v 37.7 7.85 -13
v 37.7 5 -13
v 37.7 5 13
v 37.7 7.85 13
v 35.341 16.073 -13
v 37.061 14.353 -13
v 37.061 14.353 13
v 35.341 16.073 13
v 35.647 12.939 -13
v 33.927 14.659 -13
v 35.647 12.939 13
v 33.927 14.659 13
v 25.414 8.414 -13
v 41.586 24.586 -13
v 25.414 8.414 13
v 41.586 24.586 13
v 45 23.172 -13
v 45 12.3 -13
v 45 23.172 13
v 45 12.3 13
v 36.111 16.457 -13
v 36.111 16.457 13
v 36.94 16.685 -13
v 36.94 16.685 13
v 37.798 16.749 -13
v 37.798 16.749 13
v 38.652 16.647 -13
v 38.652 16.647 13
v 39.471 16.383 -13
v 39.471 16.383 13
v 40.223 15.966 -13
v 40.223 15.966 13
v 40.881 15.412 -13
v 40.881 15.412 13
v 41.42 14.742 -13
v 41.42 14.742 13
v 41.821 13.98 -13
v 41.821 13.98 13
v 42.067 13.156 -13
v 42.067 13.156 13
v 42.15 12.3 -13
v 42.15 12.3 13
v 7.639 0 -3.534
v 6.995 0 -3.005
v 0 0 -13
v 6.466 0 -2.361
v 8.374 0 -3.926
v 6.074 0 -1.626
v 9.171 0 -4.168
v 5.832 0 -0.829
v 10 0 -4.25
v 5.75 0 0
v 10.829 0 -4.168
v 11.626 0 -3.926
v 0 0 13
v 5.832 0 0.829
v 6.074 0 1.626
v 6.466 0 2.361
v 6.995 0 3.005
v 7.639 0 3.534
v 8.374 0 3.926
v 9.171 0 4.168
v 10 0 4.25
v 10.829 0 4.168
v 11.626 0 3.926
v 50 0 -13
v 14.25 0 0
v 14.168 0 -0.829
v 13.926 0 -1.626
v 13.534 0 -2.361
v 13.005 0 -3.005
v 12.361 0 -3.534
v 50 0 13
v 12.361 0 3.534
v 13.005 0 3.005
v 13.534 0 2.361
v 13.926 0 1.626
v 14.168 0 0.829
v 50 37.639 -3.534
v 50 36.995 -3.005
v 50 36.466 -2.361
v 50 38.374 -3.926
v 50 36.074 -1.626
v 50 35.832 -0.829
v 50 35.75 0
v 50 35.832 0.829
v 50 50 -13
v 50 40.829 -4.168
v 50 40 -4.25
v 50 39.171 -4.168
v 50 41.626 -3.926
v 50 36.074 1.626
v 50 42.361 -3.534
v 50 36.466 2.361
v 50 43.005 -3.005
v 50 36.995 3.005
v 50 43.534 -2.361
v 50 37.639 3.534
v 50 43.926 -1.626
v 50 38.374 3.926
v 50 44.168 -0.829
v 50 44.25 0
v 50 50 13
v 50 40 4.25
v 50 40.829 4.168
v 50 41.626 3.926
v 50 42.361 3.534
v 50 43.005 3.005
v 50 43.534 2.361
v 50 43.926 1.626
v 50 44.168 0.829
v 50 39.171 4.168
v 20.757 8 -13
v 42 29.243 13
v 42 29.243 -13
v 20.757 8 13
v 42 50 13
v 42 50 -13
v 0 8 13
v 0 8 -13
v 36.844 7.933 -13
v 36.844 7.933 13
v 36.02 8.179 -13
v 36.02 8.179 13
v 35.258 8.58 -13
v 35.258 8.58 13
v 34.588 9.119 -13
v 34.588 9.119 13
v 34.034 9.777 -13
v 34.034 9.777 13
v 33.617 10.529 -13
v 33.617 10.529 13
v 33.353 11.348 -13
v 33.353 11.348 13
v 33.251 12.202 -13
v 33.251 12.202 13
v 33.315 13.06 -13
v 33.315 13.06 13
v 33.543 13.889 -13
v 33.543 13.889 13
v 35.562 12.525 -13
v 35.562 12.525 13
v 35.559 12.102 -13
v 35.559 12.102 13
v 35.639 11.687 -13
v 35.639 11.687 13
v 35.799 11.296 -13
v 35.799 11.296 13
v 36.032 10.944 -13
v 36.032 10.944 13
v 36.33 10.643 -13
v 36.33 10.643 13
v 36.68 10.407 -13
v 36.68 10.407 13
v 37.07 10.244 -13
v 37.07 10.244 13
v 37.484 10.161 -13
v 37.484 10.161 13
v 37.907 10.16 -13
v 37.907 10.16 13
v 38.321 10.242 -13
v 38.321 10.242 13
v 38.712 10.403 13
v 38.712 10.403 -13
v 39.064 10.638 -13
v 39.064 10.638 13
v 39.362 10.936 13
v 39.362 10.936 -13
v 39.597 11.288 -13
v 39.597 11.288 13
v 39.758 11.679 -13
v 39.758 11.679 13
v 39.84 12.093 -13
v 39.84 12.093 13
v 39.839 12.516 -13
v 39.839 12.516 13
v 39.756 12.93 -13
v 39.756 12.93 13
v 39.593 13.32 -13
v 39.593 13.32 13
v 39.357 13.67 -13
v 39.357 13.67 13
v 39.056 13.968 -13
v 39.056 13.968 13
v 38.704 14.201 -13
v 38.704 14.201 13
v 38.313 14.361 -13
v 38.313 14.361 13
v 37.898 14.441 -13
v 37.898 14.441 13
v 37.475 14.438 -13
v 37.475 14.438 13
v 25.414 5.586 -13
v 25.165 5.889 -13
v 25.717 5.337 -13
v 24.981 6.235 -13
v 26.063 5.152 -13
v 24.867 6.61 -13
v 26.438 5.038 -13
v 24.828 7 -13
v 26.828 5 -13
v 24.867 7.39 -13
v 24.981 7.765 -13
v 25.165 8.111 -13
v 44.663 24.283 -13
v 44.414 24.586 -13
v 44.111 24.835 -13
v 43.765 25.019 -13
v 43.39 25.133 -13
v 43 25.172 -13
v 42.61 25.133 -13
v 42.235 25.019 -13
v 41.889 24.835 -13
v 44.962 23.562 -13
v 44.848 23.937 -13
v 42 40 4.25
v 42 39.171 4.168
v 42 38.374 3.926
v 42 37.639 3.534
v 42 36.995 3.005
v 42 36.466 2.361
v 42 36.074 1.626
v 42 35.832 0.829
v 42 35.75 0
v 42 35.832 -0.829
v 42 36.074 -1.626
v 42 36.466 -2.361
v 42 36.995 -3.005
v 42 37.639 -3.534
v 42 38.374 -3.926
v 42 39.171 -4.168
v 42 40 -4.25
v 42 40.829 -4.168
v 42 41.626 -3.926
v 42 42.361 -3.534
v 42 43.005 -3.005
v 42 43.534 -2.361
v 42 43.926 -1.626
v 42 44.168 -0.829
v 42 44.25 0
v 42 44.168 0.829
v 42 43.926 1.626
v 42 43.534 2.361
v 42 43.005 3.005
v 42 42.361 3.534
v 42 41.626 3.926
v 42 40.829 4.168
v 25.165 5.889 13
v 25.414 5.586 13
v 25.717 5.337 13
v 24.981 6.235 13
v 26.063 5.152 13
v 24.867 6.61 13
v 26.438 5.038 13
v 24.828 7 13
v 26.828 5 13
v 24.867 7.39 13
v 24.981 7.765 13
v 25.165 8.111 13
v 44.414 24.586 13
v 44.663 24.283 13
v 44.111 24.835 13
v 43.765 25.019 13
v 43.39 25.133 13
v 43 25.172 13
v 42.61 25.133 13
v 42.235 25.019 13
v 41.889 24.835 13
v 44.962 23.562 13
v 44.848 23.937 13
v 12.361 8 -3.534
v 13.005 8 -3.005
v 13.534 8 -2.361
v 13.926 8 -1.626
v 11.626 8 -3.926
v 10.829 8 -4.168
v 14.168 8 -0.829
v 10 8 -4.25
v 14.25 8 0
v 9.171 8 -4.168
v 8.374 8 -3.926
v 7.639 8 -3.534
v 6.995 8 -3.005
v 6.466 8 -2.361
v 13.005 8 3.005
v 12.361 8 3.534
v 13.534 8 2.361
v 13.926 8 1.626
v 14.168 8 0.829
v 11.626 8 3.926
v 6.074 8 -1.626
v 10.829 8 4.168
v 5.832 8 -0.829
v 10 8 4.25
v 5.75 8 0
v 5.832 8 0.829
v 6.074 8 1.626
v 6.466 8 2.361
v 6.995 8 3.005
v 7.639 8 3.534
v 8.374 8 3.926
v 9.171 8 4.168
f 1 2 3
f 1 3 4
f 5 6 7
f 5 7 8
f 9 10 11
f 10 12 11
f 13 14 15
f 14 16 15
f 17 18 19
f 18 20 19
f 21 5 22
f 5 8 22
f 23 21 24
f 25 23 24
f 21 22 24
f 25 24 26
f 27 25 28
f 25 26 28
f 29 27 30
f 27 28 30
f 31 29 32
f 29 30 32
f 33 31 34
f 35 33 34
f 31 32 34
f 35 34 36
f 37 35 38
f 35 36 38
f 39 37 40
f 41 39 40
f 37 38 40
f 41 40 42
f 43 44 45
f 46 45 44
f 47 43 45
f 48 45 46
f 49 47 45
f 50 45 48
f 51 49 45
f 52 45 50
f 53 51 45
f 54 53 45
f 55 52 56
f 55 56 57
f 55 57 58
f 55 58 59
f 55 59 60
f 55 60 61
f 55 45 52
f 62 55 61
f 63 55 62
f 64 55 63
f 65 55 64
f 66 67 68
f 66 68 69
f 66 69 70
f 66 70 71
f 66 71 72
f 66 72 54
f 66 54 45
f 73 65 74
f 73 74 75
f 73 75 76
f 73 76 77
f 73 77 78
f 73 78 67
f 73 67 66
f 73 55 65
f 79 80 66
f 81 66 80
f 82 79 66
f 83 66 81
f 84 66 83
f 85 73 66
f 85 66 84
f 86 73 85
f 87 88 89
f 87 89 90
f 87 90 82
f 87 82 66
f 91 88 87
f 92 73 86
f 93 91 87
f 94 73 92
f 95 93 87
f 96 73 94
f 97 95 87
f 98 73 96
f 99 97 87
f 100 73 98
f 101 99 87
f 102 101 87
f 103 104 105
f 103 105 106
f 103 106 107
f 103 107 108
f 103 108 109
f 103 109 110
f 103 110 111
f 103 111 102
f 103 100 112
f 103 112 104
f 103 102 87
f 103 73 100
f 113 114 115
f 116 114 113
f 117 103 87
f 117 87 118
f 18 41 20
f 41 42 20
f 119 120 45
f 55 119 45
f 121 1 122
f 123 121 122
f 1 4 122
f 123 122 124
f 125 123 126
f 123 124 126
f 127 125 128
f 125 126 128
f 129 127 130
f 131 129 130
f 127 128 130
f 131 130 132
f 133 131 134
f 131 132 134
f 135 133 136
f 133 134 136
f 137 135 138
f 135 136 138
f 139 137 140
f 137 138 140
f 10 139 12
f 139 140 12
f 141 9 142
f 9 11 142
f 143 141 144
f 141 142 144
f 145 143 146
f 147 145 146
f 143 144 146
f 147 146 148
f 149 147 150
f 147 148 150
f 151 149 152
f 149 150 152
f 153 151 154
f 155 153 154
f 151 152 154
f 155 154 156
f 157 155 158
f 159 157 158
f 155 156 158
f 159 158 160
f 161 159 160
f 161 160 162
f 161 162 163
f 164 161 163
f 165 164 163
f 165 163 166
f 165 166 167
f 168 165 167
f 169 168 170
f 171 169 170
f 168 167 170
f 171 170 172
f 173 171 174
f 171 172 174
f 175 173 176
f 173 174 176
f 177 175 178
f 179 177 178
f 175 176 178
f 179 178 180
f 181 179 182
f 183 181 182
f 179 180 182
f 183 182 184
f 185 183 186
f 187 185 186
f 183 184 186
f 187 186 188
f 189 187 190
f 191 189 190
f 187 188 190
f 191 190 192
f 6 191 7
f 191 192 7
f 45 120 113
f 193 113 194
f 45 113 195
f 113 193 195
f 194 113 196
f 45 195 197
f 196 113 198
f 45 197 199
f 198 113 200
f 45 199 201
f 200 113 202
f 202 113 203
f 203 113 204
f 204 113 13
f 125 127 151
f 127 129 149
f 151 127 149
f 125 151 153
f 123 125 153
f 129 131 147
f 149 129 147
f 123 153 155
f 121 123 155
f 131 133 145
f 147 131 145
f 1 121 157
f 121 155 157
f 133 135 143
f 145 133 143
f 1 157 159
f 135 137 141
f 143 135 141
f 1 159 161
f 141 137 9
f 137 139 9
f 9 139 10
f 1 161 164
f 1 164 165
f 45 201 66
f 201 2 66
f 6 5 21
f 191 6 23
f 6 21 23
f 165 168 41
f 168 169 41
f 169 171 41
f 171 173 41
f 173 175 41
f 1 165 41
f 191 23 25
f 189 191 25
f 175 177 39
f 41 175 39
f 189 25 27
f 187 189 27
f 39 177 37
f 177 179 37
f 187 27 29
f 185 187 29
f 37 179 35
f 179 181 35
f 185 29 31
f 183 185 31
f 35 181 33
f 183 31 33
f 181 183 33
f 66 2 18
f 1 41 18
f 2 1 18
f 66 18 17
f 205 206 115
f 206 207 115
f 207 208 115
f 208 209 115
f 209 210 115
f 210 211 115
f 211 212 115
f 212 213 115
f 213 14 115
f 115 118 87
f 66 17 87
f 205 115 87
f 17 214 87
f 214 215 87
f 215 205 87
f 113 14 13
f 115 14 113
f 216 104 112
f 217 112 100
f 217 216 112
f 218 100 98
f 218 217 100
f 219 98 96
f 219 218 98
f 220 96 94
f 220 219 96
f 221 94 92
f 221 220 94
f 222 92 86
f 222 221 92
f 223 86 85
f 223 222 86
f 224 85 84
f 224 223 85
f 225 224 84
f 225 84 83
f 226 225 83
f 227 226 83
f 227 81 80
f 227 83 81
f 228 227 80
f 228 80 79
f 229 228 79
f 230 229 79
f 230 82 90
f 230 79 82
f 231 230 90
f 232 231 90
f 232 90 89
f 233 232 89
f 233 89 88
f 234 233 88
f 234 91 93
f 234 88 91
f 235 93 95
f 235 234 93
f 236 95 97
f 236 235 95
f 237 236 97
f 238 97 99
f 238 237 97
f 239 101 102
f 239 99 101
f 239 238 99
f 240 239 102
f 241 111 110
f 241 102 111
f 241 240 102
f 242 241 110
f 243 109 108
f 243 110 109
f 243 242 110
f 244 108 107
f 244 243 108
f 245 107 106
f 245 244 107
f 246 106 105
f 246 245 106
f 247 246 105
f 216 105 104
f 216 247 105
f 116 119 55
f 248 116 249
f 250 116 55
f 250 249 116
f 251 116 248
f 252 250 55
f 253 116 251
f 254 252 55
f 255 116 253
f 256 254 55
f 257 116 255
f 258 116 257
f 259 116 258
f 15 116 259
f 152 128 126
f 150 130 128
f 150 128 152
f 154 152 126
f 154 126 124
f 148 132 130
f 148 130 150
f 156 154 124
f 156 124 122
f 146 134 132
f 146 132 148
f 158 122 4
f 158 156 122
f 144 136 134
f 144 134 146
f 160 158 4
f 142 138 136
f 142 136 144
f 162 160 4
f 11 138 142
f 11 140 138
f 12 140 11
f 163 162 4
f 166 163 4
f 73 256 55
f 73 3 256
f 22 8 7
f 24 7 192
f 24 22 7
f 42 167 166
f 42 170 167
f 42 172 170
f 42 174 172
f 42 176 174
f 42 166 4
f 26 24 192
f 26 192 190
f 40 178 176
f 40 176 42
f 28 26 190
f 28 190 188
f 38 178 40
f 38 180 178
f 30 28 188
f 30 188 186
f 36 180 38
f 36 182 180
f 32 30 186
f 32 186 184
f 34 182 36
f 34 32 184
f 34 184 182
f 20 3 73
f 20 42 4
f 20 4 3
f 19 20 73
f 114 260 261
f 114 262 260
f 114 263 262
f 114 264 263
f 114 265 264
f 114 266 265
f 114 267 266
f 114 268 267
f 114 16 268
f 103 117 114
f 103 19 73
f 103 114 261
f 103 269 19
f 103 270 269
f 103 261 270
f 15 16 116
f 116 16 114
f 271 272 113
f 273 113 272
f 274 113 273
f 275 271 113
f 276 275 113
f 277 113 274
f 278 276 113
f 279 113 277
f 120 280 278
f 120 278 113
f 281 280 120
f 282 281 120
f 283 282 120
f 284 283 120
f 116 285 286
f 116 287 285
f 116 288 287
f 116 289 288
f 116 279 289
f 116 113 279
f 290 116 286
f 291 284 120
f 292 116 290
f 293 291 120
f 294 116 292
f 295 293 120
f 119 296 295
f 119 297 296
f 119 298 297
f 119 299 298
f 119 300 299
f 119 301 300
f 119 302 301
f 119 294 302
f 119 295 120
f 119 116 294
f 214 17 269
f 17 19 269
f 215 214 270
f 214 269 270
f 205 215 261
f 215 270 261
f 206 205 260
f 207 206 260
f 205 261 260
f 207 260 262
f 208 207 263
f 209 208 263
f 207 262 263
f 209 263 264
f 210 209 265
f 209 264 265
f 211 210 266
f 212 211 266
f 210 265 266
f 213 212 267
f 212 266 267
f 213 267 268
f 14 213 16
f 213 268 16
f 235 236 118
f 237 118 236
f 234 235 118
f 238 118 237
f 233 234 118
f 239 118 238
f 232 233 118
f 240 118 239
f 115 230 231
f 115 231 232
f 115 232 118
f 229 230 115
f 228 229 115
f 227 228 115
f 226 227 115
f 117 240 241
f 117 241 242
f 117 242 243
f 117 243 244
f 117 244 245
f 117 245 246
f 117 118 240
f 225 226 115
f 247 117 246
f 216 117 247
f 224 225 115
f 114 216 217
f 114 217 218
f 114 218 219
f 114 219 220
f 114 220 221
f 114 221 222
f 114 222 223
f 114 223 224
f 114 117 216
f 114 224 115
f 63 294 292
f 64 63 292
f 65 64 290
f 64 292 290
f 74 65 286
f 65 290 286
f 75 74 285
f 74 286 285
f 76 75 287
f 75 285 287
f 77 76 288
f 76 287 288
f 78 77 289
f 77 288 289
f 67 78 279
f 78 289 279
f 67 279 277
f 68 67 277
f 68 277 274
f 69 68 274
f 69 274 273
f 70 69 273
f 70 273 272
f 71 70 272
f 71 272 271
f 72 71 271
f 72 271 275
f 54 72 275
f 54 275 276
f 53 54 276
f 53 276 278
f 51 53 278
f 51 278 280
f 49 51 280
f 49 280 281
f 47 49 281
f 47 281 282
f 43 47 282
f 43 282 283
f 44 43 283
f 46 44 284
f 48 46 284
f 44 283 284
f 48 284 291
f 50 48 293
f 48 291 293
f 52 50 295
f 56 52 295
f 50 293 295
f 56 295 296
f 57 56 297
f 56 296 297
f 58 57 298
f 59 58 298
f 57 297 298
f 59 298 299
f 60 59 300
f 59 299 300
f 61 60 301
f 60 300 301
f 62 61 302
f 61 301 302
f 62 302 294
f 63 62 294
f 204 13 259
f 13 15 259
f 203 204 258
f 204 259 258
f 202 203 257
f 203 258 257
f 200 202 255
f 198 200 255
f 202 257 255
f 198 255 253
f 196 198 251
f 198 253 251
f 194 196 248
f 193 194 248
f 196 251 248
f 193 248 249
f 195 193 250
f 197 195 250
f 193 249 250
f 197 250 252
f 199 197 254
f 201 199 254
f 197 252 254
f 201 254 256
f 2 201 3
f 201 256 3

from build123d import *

# Parameters (mm, degrees)
EXTRUDE_1_DEPTH     = 13
SKETCH_3_R          = 4.25
CUT_EXTRUDE_1_DEPTH = 67.580778007


with BuildPart() as part:
    # 草图1 → 凸台-拉伸1 (new, symmetric)
    with BuildSketch(Plane.XY):
        Polygon((0, 0), (50, 0), (50, 50), (42, 50), (42, 29.242640687), (20.757359313, 8), (0, 8), align=None)
        with BuildLine():
            Line((37.061279898, 14.352933665), (35.340960992, 16.07325257))
            ThreePointArc((35.340960992, 16.07325257), (39.856939547, 16.192314452), (42.15, 12.3))
            Line((42.15, 12.3), (45, 12.3))
            Line((45, 12.3), (45, 23.171572875))
            ThreePointArc((45, 23.171572875), (43.765366865, 25.01933194), (41.585786438, 24.585786438))
            Line((41.585786438, 24.585786438), (25.414213562, 8.414213562))
            ThreePointArc((25.414213562, 8.414213562), (24.98066806, 6.234633135), (26.828427125, 5))
            Line((26.828427125, 5), (37.7, 5))
            Line((37.7, 5), (37.7, 7.85))
            ThreePointArc((37.7, 7.85), (33.807685548, 10.143060453), (33.92674743, 14.659039008))
            Line((33.92674743, 14.659039008), (35.647066335, 12.938720102))
            ThreePointArc((35.647066335, 12.938720102), (39.22027958, 10.77972042), (37.061279898, 14.352933665))
        make_face(mode=Mode.SUBTRACT)
    extrude(amount=EXTRUDE_1_DEPTH, both=True)

    # 草图3 → 切除-拉伸1 (cut, through all)
    with BuildSketch(Plane(origin=(0, 8, 0), x_dir=(1, 0, 0), z_dir=(0, 1, 0))):
        with Locations(Location((10, 0, 0), (0, 0, 270))):
            Circle(SKETCH_3_R)
    cut_extrude_1 = extrude(amount=-CUT_EXTRUDE_1_DEPTH, mode=Mode.SUBTRACT)

    # 镜向1: 切除-拉伸1 across plane
    add(cut_extrude_1.mirror(Plane(origin=(25, 25, 0), x_dir=(0, 0, 1), z_dir=(-0.7071067811865489, -0.7071067811865462, 0))), mode=Mode.SUBTRACT)


solid = part.part
